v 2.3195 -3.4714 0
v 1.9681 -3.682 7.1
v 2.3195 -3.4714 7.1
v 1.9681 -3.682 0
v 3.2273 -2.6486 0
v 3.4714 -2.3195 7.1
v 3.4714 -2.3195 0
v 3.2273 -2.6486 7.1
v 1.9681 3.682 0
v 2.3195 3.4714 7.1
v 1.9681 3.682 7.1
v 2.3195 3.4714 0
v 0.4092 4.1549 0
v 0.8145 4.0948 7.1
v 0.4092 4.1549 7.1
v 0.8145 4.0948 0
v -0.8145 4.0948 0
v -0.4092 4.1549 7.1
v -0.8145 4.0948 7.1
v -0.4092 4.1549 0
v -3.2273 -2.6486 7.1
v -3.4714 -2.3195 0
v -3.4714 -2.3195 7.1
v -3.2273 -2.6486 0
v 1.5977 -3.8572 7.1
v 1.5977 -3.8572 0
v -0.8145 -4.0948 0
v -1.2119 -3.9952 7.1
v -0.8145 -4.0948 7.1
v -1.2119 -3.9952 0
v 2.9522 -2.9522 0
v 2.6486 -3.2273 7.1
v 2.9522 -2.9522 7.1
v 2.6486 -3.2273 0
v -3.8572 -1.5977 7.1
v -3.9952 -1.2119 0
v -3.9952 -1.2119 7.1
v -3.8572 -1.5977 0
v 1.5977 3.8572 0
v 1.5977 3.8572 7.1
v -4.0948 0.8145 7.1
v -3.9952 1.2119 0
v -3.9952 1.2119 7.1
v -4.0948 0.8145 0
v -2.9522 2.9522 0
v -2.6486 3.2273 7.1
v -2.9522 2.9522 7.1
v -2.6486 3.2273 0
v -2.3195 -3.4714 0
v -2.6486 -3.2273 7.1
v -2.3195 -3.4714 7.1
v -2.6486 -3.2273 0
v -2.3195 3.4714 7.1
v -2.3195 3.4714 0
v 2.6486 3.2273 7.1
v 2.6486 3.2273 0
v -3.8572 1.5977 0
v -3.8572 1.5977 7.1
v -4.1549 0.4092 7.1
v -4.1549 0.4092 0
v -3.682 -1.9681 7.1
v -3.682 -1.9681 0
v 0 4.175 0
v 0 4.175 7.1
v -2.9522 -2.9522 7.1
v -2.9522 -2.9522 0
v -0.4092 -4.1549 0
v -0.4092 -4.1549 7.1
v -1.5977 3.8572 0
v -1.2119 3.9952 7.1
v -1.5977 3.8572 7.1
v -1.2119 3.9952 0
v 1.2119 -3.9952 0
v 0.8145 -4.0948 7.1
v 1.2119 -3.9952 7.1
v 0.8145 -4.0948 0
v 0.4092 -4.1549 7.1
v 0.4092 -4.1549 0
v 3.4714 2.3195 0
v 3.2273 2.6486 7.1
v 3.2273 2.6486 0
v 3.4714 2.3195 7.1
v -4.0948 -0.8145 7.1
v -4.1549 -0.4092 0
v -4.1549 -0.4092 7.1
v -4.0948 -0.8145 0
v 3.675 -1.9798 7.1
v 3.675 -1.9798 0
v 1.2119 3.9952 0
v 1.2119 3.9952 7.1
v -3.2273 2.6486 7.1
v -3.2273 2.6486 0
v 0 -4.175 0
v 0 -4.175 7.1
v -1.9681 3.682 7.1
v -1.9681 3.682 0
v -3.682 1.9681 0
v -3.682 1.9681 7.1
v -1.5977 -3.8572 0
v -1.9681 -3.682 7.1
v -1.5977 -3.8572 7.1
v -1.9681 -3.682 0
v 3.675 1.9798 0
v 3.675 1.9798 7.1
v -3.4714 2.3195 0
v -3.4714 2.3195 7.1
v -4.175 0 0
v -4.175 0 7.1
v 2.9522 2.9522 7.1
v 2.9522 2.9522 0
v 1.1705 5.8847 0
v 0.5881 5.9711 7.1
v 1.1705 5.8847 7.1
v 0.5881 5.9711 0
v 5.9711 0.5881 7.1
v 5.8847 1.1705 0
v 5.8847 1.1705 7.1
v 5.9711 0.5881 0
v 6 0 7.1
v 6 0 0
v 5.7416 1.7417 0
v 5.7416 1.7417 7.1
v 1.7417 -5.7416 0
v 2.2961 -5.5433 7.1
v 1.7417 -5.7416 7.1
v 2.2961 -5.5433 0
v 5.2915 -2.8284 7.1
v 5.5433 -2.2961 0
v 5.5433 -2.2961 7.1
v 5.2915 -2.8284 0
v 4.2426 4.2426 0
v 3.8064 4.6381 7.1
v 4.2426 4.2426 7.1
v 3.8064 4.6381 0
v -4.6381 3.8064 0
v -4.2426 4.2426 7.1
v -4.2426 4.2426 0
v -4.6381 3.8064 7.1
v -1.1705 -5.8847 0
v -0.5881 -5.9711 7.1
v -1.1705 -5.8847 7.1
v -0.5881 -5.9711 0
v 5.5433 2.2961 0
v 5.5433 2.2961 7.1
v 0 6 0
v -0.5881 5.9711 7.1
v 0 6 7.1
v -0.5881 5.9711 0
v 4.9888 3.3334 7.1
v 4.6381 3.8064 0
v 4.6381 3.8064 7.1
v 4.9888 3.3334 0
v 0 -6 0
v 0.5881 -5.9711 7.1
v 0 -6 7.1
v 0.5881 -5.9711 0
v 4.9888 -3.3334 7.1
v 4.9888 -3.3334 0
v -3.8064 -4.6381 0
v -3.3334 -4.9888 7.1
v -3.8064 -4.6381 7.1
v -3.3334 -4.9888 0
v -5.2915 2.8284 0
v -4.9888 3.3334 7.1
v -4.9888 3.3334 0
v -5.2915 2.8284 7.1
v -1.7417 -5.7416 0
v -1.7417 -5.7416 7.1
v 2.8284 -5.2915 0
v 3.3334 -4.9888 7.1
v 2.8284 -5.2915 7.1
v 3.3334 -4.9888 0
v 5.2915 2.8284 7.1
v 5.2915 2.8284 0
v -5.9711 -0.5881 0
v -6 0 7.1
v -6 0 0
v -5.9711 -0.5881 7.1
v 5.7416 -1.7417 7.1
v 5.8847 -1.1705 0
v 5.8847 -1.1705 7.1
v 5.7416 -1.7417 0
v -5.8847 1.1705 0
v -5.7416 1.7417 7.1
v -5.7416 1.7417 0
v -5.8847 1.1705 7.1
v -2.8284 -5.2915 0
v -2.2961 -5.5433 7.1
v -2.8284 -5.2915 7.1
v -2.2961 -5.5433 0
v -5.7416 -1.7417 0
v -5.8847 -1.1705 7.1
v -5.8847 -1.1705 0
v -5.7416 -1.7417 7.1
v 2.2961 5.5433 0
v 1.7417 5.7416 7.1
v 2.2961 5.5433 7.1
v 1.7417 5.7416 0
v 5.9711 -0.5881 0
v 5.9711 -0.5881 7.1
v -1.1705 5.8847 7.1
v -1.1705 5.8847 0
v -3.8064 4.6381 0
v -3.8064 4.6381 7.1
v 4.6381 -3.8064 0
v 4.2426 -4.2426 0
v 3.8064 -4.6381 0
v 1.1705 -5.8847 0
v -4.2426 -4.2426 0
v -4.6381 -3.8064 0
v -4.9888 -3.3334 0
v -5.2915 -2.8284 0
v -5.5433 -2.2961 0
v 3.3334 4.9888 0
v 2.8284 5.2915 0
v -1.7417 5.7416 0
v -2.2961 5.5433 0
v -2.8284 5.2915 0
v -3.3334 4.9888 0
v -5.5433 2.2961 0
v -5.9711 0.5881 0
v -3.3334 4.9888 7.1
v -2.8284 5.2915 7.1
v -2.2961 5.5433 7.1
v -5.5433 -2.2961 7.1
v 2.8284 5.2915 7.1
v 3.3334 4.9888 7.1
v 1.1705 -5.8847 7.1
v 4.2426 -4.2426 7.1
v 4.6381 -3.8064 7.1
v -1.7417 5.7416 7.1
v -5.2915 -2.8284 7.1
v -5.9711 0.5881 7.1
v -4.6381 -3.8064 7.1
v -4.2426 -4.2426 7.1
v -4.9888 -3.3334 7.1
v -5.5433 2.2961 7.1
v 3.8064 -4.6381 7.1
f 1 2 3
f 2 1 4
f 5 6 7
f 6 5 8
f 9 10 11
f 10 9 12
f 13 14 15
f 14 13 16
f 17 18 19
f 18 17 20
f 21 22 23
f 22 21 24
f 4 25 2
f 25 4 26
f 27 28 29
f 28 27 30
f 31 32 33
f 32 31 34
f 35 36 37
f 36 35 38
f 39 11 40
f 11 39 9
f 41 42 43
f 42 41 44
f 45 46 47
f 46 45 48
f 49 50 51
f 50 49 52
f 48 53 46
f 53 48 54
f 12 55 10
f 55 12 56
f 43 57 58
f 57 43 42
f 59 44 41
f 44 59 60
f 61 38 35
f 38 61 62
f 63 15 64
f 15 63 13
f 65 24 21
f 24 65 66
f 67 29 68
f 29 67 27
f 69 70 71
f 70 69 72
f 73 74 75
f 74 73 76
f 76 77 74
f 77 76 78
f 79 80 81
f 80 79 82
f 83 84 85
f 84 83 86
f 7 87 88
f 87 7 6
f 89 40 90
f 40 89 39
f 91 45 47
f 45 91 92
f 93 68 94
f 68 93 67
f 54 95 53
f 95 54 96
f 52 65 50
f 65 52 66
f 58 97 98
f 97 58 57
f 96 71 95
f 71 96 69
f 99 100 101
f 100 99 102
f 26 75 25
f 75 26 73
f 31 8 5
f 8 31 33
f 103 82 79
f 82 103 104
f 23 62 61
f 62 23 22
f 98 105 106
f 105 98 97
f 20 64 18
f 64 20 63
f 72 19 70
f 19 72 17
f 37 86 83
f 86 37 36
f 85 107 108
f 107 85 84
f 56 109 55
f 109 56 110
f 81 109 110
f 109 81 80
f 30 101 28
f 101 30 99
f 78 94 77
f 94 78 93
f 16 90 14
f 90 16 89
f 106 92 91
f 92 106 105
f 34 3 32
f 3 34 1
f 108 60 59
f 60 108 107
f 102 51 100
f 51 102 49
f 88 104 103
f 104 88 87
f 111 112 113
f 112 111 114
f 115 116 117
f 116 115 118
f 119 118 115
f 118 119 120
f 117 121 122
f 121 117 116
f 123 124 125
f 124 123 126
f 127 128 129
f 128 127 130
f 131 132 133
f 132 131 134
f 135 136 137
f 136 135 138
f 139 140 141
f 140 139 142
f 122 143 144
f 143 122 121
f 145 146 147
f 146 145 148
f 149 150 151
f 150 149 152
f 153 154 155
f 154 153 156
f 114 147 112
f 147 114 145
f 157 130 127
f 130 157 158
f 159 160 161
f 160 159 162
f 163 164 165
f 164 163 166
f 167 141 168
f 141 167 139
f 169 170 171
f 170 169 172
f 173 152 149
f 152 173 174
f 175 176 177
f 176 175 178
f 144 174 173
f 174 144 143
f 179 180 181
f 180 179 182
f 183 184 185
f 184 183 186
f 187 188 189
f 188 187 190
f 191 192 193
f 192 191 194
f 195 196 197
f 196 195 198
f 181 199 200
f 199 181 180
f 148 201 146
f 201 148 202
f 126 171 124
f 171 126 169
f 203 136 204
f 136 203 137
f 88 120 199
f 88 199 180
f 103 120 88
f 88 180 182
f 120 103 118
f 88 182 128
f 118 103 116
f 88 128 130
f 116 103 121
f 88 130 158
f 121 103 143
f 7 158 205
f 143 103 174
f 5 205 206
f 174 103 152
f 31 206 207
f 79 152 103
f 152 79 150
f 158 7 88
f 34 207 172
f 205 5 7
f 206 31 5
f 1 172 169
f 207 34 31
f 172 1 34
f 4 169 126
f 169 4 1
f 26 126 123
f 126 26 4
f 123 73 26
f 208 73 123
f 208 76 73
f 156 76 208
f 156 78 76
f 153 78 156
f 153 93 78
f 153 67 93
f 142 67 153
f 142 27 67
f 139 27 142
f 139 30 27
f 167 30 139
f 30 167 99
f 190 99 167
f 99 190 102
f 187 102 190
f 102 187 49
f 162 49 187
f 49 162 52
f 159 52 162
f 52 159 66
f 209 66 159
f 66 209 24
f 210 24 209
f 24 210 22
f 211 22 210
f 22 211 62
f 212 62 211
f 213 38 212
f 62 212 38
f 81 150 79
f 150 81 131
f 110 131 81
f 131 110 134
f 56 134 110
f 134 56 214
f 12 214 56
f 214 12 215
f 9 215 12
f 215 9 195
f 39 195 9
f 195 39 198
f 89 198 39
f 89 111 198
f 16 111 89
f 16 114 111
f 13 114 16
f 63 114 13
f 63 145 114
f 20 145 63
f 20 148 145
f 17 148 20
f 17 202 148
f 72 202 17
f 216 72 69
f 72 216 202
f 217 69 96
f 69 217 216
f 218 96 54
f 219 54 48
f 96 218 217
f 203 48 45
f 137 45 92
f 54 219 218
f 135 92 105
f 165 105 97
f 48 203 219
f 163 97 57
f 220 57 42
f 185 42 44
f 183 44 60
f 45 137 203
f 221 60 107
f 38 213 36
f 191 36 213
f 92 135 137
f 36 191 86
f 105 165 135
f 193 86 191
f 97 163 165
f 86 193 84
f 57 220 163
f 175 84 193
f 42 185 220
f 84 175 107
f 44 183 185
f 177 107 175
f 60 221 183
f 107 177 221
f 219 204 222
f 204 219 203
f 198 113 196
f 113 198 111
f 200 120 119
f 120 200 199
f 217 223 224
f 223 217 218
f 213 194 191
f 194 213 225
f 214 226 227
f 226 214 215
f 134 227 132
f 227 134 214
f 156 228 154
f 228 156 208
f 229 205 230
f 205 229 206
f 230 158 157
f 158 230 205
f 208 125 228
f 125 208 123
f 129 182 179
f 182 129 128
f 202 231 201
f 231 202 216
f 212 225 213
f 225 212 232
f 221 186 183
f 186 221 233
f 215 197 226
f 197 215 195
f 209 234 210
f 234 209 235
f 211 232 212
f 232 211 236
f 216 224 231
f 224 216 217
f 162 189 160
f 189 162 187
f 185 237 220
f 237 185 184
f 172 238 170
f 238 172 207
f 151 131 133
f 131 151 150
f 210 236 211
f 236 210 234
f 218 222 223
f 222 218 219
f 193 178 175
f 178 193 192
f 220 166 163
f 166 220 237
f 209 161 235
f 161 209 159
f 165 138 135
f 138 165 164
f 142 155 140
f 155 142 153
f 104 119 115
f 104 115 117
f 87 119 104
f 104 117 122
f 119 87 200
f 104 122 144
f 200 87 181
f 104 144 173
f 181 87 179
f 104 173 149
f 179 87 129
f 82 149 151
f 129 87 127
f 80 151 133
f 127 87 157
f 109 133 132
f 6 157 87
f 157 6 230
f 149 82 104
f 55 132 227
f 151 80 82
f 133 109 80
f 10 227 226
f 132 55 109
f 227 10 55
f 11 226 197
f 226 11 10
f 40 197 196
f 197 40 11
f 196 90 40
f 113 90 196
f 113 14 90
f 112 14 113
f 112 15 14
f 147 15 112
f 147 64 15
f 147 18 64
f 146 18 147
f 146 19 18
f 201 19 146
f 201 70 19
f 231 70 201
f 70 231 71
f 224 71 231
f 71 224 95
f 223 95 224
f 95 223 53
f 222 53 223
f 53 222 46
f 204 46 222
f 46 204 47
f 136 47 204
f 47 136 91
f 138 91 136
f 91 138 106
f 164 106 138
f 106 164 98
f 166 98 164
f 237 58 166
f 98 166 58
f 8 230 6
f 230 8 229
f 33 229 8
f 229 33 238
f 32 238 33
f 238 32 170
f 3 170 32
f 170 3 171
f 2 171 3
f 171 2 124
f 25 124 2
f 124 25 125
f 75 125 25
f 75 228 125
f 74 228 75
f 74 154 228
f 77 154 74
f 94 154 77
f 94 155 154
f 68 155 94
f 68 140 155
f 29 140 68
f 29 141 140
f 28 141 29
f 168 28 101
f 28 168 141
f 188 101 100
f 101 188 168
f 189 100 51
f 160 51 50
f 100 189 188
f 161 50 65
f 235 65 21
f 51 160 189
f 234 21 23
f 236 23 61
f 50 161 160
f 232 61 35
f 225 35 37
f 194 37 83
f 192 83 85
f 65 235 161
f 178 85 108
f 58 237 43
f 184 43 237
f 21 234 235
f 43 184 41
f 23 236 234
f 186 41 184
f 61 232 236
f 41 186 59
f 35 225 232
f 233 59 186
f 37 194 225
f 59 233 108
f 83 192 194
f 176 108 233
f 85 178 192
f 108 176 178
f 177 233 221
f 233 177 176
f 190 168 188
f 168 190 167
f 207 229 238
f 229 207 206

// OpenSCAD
// Gen-CJ — gap sleeve: rigid spacer on the shaft BETWEEN the two rotor carriers (passes through the stator
// hole). Length = m2m, so it sets the magnet gap and carries the full magnet pull. Print x1, upright.
include <parameters.scad>;
$fn = 64;
// D-flat keyed bore: flat faces +X (angle 0 = magnet pocket 0 = index notch)
module dflat_bore(h) {
    intersection() {
        cylinder(d=shaft_bore, h=h);
        translate([-shaft_bore, -shaft_bore, 0]) cube([shaft_bore + dflat_x, 2*shaft_bore, h]);
    }
}

difference() {
    cylinder(d=sleeve_od, h=m2m);
    translate([0, 0, -0.1]) dflat_bore(m2m + 0.2);
}
